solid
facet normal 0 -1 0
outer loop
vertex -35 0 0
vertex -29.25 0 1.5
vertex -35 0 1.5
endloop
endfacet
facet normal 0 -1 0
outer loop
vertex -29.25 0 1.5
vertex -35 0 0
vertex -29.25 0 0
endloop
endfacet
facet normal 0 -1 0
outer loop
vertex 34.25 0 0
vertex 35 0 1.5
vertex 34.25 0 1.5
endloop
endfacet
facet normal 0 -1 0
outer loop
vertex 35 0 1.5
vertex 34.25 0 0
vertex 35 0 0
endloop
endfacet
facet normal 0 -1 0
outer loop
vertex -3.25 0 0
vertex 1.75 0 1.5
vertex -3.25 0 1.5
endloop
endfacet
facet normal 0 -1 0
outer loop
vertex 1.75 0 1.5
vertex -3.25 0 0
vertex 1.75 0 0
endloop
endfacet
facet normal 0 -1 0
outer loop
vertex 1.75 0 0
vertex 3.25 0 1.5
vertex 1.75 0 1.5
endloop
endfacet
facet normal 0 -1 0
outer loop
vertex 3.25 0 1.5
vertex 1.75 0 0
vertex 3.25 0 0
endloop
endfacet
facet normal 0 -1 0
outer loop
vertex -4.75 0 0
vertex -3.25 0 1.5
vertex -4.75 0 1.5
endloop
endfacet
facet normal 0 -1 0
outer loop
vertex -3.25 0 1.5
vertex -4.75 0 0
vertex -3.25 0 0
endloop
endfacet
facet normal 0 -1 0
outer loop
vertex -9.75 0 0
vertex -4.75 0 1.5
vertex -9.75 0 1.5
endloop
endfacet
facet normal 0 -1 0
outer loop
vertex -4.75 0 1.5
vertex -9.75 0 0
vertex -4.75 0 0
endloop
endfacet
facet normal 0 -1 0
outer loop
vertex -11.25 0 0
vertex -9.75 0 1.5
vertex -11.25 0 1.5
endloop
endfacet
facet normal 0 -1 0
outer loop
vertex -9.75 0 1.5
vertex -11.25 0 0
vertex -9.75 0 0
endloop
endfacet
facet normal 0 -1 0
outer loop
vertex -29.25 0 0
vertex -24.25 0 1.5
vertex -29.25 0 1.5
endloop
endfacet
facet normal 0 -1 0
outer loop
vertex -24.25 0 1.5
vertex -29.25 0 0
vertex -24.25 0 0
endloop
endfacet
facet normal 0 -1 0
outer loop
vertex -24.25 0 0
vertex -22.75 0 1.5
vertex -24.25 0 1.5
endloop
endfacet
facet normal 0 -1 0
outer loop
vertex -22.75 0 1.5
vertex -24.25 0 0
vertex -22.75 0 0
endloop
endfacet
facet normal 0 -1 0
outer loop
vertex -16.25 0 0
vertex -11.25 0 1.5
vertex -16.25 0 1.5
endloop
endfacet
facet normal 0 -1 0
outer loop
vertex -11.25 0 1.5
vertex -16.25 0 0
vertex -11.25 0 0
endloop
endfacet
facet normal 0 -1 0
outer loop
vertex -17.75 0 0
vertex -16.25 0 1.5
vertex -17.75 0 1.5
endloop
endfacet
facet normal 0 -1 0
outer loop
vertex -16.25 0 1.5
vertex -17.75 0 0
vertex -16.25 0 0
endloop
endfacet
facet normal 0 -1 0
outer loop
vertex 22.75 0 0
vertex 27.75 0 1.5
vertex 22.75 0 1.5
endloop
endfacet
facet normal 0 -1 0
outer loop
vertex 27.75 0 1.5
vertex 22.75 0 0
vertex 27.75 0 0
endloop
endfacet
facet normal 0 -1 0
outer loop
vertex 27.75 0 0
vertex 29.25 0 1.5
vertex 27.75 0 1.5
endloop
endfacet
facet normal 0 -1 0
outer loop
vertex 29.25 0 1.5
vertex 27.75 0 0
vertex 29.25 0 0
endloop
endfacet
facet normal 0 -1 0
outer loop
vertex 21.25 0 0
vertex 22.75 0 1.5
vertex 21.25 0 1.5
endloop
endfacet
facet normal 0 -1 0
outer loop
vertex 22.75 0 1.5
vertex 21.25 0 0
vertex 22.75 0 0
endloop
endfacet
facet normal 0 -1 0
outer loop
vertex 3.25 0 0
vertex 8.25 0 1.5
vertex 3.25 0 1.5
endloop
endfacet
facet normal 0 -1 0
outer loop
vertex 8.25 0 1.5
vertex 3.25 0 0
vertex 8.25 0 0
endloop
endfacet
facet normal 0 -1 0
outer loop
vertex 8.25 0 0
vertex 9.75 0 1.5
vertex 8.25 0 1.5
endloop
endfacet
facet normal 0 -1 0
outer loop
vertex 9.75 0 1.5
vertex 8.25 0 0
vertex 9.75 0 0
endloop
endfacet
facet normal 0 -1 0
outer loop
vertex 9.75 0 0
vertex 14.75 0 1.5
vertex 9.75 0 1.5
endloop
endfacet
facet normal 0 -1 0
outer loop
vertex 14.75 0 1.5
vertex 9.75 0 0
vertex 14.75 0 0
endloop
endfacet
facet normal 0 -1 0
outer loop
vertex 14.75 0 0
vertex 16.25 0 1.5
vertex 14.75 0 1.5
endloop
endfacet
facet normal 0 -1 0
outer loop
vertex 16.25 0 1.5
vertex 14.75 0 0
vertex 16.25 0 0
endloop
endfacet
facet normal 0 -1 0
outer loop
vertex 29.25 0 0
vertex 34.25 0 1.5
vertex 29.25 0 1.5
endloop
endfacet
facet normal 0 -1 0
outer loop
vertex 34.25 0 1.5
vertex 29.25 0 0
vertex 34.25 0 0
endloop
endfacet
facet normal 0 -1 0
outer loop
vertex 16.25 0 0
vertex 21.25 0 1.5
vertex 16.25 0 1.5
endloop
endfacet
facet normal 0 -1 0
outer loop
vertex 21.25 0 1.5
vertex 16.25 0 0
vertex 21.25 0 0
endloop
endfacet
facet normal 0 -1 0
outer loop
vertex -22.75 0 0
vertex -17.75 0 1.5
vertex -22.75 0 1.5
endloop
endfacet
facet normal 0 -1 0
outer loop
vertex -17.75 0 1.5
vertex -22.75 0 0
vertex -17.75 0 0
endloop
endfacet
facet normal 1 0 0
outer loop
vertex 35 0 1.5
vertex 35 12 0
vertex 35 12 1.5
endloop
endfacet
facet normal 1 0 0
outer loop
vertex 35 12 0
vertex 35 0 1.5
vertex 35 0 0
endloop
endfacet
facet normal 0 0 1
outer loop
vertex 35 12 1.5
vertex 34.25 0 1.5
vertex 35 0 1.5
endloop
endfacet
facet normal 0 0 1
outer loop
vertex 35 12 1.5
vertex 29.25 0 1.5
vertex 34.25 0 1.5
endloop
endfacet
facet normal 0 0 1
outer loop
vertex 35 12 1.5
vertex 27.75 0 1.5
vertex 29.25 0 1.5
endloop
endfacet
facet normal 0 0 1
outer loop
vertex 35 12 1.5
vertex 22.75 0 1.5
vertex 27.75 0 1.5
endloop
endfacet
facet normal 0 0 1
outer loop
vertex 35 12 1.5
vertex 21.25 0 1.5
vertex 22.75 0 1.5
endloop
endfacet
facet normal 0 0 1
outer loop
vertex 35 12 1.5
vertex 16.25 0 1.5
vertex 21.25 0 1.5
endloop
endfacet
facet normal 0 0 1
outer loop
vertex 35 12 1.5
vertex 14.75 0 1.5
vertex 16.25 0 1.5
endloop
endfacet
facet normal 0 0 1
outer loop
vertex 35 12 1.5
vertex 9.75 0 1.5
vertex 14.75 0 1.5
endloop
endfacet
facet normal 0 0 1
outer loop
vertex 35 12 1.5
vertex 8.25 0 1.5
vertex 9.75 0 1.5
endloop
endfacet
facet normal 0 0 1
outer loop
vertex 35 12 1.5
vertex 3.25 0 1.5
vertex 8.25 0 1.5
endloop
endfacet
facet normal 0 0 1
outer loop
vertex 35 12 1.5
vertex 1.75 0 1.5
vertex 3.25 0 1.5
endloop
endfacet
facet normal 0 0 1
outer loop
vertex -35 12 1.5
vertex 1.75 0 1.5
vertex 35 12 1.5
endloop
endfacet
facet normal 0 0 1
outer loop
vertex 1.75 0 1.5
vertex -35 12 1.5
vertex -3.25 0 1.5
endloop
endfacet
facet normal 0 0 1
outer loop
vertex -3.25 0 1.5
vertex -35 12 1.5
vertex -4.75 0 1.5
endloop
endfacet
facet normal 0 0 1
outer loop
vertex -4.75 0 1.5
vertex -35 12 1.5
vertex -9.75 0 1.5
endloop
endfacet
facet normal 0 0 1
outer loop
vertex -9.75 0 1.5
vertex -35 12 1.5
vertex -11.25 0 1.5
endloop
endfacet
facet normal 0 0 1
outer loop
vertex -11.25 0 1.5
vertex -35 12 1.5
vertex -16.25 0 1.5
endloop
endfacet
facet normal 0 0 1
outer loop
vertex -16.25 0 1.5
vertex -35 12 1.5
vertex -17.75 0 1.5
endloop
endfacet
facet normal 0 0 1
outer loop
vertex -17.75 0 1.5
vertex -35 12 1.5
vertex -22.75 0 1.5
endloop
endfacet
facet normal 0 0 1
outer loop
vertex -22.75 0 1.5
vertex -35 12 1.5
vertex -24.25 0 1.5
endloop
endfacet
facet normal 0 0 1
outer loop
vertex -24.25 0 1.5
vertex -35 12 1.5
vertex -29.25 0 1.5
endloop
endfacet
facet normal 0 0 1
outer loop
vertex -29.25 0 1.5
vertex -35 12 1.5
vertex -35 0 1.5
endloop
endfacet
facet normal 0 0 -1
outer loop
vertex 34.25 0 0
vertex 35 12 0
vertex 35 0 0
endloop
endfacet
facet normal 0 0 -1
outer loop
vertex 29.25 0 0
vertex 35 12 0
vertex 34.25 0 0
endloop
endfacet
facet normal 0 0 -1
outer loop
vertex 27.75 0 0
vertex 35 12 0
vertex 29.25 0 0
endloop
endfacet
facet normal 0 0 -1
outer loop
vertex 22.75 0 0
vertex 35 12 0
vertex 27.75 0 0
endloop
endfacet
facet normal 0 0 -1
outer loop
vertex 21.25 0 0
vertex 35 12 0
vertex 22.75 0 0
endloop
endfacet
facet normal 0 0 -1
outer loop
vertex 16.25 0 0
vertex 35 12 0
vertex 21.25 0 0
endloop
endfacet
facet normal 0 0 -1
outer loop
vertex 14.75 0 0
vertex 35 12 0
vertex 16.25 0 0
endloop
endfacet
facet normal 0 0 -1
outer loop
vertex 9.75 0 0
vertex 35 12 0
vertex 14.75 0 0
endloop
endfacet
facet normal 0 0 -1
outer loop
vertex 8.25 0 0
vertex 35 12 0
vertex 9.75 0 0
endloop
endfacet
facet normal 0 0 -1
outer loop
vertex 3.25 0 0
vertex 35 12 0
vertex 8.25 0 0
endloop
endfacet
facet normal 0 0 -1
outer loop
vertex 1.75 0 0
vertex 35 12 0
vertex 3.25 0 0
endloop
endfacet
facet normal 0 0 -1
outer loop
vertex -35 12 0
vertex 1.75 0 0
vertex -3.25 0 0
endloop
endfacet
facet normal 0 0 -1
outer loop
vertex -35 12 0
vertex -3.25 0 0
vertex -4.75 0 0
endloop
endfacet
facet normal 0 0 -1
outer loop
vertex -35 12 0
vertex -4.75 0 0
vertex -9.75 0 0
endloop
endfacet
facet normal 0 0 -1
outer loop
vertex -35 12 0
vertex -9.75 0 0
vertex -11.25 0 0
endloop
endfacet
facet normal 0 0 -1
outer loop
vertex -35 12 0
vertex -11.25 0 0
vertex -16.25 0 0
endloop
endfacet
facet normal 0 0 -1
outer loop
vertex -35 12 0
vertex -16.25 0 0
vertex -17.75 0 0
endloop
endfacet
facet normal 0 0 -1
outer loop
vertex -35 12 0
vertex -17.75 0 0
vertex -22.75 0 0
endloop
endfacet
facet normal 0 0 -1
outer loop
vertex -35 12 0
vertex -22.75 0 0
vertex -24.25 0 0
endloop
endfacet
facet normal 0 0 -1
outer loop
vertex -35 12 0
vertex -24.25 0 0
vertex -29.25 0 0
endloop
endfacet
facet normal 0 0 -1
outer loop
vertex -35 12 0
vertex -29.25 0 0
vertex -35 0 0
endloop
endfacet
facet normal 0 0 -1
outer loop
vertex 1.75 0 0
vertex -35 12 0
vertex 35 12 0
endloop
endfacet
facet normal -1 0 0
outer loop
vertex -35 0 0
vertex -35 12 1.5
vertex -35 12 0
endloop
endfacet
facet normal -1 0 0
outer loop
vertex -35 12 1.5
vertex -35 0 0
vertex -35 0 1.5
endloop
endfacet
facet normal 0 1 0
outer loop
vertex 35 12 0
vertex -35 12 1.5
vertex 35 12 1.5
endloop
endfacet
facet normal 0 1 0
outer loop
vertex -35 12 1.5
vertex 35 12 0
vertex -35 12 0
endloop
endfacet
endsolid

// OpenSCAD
// 10-well comb for agarose gel casting, printed lying flat
// Units: mm

// ---- Spine ----
spine_len   = 70;   // spine length (X)
spine_wid   = 12;   // spine width (Y)
plate_thk   = 1.5;  // plate thickness (Z)

// ---- Teeth ----
tooth_count = 10;   // number of teeth
tooth_w     = 5.0;  // tooth width (X)
tooth_l     = 12;   // tooth length (Y)
tooth_h     = 12;   // tooth height from spine (-Y)

// ---- Misc ----
eps         = 0.5;  // cutter overshoot
$fn         = 64;

// Pitch between tooth centres
pitch = tooth_w + 1.5;

difference() {
    // Base plate
    translate([-spine_len/2, 0, 0])
        cube([spine_len, spine_wid, plate_thk]);

    // Teeth row, centred on spine in X
    for (i = [0 : tooth_count - 1]) {
        x = (i - (tooth_count - 1) / 2) * pitch;
        translate([x, -tooth_h, 0])
            cube([tooth_w, tooth_l, plate_thk + eps]);
    }
}
